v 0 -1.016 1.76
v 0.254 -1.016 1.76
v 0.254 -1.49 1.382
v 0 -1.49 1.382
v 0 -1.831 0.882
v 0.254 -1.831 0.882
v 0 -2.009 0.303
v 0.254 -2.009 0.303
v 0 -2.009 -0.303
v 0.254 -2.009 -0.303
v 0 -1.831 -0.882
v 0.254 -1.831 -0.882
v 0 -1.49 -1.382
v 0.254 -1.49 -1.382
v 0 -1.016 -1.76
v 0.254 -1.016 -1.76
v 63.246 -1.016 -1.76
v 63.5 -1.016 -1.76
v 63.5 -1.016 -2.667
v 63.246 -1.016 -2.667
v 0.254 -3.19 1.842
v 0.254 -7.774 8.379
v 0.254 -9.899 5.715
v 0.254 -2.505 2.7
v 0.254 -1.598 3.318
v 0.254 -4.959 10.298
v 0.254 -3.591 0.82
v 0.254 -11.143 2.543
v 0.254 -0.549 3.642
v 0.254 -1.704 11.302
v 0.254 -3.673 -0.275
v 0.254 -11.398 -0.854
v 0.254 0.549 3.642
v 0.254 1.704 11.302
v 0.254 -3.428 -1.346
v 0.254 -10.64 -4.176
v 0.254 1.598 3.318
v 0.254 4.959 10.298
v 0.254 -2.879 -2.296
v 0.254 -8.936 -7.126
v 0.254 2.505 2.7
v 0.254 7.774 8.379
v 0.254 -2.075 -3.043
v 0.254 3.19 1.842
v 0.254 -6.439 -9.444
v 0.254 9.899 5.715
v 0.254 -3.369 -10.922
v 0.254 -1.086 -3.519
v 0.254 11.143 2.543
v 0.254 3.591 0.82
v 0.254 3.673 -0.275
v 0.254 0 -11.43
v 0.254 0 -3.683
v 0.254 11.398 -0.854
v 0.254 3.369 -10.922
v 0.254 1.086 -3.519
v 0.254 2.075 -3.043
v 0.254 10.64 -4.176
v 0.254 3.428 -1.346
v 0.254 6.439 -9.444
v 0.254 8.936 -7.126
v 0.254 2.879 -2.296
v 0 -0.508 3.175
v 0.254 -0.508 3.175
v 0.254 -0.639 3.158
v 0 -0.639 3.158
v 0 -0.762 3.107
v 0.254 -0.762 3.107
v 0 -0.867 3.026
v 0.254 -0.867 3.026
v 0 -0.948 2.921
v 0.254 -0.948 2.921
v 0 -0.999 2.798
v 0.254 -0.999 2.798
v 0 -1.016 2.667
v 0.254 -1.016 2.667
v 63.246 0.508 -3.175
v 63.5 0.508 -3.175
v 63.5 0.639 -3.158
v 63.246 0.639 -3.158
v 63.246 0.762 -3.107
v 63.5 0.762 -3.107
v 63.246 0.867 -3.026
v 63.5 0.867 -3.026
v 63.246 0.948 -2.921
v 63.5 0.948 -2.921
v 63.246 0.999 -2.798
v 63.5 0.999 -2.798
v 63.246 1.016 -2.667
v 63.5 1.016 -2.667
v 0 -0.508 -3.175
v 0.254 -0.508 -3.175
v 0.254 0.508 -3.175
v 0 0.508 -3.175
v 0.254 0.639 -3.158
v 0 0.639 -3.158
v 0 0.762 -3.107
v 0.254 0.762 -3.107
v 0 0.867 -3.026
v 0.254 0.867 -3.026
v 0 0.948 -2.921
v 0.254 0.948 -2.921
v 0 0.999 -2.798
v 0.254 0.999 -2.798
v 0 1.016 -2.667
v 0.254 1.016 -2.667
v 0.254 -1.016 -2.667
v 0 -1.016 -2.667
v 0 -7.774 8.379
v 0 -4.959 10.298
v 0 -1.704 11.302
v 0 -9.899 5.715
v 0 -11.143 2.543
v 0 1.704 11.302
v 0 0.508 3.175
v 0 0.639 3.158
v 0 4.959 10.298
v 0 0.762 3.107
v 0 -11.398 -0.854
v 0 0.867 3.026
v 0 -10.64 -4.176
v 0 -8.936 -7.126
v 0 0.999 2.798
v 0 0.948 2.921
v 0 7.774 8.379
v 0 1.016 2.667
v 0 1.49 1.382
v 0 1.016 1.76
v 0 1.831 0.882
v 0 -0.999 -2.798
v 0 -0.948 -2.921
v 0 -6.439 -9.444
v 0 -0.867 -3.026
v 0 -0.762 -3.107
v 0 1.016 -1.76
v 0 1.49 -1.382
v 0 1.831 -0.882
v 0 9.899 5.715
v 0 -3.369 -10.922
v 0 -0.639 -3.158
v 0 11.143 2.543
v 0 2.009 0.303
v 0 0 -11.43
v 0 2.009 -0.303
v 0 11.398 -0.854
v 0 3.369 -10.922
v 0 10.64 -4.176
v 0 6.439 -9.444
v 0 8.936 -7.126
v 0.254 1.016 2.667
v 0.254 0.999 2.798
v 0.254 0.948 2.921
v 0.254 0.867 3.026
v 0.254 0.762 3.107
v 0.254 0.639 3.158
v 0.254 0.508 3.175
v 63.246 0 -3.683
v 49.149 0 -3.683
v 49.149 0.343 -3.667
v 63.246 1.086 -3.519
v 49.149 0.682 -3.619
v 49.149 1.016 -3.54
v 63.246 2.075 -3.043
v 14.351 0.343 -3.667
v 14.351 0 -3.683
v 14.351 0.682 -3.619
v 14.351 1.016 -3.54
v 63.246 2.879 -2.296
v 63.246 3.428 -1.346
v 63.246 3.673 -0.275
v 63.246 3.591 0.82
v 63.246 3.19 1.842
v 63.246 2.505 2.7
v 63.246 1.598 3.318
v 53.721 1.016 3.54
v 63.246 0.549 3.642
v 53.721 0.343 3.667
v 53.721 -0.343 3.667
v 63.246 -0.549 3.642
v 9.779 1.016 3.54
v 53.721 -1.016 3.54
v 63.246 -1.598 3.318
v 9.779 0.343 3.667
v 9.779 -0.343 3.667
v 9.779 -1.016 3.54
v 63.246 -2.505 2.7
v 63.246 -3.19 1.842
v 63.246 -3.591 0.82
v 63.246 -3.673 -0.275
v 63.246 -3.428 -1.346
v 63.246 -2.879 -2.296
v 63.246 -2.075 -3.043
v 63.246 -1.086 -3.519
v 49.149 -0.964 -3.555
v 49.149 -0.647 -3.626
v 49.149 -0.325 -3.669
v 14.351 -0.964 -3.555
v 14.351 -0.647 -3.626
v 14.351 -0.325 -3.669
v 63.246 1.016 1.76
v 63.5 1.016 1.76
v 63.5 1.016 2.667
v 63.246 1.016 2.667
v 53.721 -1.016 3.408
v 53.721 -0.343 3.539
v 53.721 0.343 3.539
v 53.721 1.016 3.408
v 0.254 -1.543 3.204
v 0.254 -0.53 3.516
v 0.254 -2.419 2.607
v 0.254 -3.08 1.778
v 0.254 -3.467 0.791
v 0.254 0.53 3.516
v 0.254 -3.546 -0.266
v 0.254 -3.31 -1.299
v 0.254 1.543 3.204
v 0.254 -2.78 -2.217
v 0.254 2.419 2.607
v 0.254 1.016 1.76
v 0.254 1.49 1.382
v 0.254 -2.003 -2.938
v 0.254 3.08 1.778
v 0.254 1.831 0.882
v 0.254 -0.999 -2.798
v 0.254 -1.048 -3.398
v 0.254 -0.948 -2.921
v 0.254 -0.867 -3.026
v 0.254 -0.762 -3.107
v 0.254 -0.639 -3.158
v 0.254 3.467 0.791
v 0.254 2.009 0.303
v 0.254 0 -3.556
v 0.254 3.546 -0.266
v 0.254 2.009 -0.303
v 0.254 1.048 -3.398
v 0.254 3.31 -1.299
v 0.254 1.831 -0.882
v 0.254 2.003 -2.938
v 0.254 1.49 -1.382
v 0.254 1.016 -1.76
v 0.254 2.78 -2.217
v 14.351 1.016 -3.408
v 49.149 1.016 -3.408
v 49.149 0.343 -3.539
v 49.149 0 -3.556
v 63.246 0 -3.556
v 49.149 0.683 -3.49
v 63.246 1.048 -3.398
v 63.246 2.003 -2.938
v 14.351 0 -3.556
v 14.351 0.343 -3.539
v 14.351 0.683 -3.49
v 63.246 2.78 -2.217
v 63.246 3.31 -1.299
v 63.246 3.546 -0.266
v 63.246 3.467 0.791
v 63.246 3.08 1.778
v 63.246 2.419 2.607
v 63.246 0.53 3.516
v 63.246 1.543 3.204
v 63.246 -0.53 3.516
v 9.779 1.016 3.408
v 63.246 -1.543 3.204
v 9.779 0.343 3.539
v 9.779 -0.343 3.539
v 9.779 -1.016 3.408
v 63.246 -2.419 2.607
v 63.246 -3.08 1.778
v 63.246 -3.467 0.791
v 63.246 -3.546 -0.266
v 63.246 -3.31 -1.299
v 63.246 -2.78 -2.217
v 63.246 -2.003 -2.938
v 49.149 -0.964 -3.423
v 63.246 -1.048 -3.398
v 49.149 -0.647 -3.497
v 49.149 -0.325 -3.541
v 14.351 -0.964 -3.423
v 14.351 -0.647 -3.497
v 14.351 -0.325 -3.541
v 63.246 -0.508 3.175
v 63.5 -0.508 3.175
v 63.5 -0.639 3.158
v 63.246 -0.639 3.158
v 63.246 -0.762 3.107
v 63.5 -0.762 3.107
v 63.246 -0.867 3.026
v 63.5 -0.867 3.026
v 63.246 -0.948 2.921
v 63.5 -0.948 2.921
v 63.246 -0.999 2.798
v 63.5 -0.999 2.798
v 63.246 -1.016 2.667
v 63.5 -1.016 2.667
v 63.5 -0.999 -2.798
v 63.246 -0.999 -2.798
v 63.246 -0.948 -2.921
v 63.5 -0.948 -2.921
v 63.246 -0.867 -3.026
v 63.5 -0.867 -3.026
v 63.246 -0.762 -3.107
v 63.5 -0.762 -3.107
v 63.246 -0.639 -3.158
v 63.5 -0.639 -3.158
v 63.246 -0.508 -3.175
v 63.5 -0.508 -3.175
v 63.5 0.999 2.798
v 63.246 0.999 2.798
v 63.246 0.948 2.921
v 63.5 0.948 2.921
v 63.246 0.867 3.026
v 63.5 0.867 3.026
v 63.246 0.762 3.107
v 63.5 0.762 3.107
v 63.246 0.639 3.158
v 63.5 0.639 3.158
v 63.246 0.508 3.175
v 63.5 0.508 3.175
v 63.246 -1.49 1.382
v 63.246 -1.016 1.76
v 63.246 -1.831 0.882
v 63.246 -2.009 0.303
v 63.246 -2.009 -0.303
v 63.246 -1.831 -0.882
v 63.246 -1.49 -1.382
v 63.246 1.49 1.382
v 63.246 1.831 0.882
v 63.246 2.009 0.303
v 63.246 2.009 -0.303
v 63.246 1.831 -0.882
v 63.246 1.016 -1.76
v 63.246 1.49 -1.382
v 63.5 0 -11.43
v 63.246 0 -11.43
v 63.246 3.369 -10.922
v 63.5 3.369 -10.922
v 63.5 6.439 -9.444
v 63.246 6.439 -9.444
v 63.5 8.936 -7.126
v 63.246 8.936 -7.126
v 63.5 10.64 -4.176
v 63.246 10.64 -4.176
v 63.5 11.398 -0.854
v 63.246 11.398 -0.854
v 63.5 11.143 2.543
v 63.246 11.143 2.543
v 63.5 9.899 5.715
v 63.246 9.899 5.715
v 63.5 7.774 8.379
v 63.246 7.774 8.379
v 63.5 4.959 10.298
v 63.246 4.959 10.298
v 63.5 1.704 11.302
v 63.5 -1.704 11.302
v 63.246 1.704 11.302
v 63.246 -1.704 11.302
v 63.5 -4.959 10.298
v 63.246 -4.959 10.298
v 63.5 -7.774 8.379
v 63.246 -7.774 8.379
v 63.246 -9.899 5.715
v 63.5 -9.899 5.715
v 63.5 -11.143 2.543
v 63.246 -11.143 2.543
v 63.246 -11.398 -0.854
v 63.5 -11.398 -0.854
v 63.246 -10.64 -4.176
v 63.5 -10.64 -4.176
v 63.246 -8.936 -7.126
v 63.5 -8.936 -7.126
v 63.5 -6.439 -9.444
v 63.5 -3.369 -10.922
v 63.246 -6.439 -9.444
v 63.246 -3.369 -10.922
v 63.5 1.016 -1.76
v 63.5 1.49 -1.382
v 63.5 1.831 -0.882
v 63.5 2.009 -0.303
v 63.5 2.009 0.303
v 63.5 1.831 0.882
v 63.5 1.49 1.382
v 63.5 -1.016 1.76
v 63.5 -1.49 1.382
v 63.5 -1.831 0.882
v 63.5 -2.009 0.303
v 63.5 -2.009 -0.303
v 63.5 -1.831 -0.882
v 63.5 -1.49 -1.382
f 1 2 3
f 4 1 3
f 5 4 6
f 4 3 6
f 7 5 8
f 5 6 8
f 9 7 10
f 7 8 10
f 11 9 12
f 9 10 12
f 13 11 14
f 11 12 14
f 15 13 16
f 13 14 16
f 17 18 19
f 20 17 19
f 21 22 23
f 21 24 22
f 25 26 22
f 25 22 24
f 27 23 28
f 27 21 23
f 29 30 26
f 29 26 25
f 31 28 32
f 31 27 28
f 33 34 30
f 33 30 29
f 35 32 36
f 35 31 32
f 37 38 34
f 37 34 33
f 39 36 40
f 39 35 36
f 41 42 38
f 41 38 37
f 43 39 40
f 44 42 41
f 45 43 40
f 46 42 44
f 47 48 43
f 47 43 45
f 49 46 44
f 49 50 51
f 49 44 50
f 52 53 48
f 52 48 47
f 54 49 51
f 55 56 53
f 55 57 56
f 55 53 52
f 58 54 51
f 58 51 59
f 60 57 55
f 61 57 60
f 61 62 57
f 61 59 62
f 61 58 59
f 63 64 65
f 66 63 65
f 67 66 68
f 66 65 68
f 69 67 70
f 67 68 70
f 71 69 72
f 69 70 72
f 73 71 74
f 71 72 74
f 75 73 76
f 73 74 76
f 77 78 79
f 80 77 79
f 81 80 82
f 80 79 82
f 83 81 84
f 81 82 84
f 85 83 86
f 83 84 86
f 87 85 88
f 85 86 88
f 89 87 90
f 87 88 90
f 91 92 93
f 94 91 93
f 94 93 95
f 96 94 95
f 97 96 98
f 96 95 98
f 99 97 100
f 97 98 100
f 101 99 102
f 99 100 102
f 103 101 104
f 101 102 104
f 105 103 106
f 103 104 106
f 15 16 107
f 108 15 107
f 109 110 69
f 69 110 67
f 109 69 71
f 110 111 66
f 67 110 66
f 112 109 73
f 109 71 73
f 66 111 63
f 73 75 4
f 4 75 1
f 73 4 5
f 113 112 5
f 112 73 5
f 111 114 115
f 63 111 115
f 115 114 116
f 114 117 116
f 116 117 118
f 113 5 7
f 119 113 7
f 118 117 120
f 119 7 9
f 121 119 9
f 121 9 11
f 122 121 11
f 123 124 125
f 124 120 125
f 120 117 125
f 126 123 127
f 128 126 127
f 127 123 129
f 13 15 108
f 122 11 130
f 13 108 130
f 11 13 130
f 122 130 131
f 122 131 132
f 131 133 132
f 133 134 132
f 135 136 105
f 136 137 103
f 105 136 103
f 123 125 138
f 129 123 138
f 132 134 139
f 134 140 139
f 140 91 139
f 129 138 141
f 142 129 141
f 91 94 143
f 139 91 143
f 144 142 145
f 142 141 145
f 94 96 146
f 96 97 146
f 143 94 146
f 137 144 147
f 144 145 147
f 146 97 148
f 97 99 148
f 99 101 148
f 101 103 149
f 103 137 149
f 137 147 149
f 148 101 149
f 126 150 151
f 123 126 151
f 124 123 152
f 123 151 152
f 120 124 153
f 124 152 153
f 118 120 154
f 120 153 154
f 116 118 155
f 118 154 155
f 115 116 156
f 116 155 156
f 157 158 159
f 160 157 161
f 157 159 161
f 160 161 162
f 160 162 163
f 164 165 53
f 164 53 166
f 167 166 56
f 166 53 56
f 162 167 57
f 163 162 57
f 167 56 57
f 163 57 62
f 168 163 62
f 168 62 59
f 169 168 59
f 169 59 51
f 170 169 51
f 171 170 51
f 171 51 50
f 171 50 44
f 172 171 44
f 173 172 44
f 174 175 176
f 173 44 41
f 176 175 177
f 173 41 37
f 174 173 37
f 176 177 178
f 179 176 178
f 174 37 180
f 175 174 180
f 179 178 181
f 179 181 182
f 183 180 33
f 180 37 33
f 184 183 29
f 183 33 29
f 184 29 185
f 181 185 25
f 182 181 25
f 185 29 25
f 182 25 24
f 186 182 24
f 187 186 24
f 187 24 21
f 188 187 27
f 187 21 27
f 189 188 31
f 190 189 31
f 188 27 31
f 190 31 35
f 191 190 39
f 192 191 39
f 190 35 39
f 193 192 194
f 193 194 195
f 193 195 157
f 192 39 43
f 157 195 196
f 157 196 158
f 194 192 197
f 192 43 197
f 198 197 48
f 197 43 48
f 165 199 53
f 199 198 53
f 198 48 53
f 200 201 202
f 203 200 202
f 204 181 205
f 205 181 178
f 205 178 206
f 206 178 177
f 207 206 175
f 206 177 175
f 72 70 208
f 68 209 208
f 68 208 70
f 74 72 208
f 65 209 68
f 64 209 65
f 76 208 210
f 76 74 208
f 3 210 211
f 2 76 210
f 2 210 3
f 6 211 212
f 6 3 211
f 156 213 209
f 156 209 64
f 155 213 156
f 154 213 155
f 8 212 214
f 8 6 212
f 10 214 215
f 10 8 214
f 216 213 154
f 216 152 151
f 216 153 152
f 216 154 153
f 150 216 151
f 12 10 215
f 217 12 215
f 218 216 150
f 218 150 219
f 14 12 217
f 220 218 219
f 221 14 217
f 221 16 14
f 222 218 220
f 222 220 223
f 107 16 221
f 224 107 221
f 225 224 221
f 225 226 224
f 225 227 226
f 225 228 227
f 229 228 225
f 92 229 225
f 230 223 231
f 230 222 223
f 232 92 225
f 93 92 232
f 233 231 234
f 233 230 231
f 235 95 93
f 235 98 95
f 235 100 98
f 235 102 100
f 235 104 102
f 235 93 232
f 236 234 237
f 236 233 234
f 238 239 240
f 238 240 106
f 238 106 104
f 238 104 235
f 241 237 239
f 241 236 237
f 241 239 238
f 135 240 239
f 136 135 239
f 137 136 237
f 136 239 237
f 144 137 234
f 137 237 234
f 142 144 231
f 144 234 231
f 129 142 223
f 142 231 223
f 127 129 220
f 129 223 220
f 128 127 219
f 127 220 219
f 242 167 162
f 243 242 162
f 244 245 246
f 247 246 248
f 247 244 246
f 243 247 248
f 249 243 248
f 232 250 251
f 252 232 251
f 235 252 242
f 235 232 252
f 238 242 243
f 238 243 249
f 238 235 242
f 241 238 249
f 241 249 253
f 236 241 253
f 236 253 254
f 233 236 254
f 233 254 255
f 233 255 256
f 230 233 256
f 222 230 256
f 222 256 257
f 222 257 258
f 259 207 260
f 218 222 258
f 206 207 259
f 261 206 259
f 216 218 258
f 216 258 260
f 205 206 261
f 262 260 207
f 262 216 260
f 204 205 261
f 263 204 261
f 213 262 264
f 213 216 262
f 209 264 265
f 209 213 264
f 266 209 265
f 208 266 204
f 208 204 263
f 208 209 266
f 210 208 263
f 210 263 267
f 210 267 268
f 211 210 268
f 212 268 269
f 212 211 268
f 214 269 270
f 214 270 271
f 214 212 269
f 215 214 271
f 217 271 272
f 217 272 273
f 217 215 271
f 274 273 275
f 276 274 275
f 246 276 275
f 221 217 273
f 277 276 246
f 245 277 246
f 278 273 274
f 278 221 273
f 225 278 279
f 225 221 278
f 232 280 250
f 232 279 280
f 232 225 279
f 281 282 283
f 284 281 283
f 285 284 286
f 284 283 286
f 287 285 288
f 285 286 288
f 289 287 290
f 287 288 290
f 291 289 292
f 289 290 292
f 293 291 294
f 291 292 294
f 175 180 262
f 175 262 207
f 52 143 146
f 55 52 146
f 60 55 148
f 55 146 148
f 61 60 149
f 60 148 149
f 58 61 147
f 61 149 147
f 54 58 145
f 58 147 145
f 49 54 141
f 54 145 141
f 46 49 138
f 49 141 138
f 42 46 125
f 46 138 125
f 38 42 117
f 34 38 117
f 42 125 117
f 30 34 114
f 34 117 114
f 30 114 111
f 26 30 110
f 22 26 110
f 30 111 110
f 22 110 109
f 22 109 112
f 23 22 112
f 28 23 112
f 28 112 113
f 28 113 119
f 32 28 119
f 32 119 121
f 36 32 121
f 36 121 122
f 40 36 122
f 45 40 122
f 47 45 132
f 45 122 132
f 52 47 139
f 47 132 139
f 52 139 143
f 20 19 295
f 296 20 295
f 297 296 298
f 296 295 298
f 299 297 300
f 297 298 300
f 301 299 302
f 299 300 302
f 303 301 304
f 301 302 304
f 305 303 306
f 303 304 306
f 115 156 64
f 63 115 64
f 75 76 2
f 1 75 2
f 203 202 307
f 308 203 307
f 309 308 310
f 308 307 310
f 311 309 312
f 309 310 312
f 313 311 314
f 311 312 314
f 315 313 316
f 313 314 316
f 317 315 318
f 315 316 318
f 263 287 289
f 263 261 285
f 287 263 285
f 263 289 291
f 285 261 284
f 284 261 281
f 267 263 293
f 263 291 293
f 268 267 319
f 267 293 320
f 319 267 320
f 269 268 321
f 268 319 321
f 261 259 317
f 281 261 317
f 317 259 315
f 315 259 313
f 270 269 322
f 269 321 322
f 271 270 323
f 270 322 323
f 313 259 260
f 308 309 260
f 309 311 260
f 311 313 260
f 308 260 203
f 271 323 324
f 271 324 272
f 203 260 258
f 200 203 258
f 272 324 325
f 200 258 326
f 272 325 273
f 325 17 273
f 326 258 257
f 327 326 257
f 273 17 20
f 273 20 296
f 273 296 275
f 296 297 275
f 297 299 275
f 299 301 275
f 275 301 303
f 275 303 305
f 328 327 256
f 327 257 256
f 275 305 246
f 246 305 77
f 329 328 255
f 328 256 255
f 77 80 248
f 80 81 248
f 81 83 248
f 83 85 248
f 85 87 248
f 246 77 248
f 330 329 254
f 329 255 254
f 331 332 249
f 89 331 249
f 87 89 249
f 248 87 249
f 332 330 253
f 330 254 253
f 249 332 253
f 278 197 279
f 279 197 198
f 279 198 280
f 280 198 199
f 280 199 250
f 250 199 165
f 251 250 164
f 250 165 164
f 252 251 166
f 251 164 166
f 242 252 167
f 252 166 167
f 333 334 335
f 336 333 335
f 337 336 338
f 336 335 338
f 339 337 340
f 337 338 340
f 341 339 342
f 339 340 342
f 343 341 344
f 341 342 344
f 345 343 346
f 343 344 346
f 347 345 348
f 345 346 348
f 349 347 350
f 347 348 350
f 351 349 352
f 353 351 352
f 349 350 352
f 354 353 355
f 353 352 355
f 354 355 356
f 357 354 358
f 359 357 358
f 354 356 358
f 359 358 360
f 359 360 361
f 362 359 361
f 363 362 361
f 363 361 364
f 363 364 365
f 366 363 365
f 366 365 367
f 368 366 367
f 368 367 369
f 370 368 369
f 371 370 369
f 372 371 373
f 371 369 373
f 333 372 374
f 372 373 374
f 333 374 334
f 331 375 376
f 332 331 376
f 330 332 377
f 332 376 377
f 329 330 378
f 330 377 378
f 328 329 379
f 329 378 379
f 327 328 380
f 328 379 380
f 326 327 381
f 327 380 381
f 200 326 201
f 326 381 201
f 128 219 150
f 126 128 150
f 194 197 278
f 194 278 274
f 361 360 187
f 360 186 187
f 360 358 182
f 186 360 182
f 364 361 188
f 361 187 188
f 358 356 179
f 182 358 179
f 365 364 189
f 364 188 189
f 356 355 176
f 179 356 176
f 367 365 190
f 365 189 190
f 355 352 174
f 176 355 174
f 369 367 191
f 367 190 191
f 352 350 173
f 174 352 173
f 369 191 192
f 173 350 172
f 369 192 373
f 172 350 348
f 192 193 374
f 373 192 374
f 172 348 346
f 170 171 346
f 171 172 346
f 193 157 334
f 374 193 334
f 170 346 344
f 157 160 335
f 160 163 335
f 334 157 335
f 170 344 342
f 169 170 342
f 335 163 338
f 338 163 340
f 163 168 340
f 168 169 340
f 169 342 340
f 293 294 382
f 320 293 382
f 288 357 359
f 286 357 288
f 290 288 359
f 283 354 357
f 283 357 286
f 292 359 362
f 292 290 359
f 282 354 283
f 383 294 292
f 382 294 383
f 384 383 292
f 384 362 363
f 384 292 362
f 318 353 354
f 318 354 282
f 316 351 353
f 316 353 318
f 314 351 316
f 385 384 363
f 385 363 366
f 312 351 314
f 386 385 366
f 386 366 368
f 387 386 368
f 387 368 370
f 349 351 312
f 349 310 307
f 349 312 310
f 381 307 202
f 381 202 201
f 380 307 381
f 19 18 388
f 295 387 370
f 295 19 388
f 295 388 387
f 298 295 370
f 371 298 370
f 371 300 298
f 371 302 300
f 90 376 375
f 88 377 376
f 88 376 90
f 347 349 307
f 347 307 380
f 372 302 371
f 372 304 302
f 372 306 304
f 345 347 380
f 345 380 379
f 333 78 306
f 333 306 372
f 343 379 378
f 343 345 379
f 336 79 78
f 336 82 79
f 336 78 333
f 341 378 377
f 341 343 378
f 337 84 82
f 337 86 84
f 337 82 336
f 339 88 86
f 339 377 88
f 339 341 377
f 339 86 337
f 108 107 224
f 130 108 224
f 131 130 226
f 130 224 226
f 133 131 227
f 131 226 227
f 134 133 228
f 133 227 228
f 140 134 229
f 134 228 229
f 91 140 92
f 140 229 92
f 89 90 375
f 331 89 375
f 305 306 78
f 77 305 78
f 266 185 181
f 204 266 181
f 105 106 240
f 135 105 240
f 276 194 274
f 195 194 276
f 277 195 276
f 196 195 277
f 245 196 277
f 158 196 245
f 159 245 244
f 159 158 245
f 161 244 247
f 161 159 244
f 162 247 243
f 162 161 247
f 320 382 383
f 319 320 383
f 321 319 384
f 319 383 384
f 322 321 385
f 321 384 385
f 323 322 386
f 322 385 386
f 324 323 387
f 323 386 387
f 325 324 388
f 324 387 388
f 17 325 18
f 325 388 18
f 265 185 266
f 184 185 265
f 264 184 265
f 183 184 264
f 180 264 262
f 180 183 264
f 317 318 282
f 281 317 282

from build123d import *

# Parameters (mm, degrees)
SKETCH1_R           = 11.43
BOSS_EXTRUDE1_DEPTH = 0.254
SKETCH2_R           = 3.683
SKETCH2_R_2         = 3.556
BOSS_EXTRUDE2_DEPTH = 62.992
SKETCH3_R           = 11.43
BOSS_EXTRUDE3_DEPTH = 0.254
SKETCH5_W           = 43.942
SKETCH5_H           = 2.032
CUT_EXTRUDE1_DEPTH  = 2.794
SKETCH6_W           = 34.798
SKETCH6_H           = 1.980001403
CUT_EXTRUDE3_DEPTH  = 2.794
SKETCH7_R           = 2.032
CUT_EXTRUDE4_DEPTH  = 64.5


with BuildPart() as part:
    # Sketch1 → Boss-Extrude1 (new body)
    with BuildSketch(Plane(origin=(0, 0, 0), x_dir=(0, 0, -1), z_dir=(1, 0, 0))):
        Circle(SKETCH1_R)
    extrude(amount=BOSS_EXTRUDE1_DEPTH)

    # Sketch2 → Boss-Extrude2 (add)
    with BuildSketch(Plane(origin=(0.254, 0, 0), x_dir=(0, 0, -1), z_dir=(1, 0, 0))):
        Circle(SKETCH2_R)
        Circle(SKETCH2_R_2, mode=Mode.SUBTRACT)
    extrude(amount=BOSS_EXTRUDE2_DEPTH)

    # Sketch3 → Boss-Extrude3 (add)
    with BuildSketch(Plane(origin=(63.246, 0, 0), x_dir=(0, 0, -1), z_dir=(1, 0, 0))):
        Circle(SKETCH3_R)
    extrude(amount=BOSS_EXTRUDE3_DEPTH)

    # Sketch5 → Cut-Extrude1 (cut)
    with BuildSketch(Plane.XY.offset(3.683)):
        with Locations((31.75, 0)):
            Rectangle(SKETCH5_W, SKETCH5_H)
    extrude(amount=-CUT_EXTRUDE1_DEPTH, mode=Mode.SUBTRACT)

    # Sketch6 → Cut-Extrude3 (cut)
    with BuildSketch(Plane.XY.offset(-3.683)):
        with Locations((31.75, 0.025999298)):
            Rectangle(SKETCH6_W, SKETCH6_H)
    extrude(amount=CUT_EXTRUDE3_DEPTH, mode=Mode.SUBTRACT)

    # Sketch7 → Cut-Extrude4 (cut, through all)
    with BuildSketch(Plane(origin=(63.5, 0, 0), x_dir=(0, 0, -1), z_dir=(1, 0, 0))):
        with BuildLine():
            Line((-2.667, -1.016), (-1.75976362, -1.016))
            ThreePointArc((-1.75976362, -1.016), (-2.032, 0), (-1.75976362, 1.016))
            Line((-1.75976362, 1.016), (-2.667, 1.016))
            ThreePointArc((-2.667, 1.016), (-3.026210245, 0.867210245), (-3.175, 0.508))
            Line((-3.175, 0.508), (-3.175, -0.508))
            ThreePointArc((-3.175, -0.508), (-3.026210245, -0.867210245), (-2.667, -1.016))
        make_face()
        with BuildLine():
            ThreePointArc((2.667, -1.016), (3.026210245, -0.867210245), (3.175, -0.508))
            Line((3.175, -0.508), (3.175, 0.508))
            ThreePointArc((3.175, 0.508), (3.026210245, 0.867210245), (2.667, 1.016))
            Line((2.667, 1.016), (1.75976362, 1.016))
            ThreePointArc((1.75976362, 1.016), (1.962761279, 0.5259203), (2.032, 0))
            ThreePointArc((2.032, 0), (1.962761279, -0.5259203), (1.75976362, -1.016))
            Line((1.75976362, -1.016), (2.667, -1.016))
        make_face()
        Circle(SKETCH7_R)
    extrude(amount=-CUT_EXTRUDE4_DEPTH, mode=Mode.SUBTRACT)


solid = part.part
